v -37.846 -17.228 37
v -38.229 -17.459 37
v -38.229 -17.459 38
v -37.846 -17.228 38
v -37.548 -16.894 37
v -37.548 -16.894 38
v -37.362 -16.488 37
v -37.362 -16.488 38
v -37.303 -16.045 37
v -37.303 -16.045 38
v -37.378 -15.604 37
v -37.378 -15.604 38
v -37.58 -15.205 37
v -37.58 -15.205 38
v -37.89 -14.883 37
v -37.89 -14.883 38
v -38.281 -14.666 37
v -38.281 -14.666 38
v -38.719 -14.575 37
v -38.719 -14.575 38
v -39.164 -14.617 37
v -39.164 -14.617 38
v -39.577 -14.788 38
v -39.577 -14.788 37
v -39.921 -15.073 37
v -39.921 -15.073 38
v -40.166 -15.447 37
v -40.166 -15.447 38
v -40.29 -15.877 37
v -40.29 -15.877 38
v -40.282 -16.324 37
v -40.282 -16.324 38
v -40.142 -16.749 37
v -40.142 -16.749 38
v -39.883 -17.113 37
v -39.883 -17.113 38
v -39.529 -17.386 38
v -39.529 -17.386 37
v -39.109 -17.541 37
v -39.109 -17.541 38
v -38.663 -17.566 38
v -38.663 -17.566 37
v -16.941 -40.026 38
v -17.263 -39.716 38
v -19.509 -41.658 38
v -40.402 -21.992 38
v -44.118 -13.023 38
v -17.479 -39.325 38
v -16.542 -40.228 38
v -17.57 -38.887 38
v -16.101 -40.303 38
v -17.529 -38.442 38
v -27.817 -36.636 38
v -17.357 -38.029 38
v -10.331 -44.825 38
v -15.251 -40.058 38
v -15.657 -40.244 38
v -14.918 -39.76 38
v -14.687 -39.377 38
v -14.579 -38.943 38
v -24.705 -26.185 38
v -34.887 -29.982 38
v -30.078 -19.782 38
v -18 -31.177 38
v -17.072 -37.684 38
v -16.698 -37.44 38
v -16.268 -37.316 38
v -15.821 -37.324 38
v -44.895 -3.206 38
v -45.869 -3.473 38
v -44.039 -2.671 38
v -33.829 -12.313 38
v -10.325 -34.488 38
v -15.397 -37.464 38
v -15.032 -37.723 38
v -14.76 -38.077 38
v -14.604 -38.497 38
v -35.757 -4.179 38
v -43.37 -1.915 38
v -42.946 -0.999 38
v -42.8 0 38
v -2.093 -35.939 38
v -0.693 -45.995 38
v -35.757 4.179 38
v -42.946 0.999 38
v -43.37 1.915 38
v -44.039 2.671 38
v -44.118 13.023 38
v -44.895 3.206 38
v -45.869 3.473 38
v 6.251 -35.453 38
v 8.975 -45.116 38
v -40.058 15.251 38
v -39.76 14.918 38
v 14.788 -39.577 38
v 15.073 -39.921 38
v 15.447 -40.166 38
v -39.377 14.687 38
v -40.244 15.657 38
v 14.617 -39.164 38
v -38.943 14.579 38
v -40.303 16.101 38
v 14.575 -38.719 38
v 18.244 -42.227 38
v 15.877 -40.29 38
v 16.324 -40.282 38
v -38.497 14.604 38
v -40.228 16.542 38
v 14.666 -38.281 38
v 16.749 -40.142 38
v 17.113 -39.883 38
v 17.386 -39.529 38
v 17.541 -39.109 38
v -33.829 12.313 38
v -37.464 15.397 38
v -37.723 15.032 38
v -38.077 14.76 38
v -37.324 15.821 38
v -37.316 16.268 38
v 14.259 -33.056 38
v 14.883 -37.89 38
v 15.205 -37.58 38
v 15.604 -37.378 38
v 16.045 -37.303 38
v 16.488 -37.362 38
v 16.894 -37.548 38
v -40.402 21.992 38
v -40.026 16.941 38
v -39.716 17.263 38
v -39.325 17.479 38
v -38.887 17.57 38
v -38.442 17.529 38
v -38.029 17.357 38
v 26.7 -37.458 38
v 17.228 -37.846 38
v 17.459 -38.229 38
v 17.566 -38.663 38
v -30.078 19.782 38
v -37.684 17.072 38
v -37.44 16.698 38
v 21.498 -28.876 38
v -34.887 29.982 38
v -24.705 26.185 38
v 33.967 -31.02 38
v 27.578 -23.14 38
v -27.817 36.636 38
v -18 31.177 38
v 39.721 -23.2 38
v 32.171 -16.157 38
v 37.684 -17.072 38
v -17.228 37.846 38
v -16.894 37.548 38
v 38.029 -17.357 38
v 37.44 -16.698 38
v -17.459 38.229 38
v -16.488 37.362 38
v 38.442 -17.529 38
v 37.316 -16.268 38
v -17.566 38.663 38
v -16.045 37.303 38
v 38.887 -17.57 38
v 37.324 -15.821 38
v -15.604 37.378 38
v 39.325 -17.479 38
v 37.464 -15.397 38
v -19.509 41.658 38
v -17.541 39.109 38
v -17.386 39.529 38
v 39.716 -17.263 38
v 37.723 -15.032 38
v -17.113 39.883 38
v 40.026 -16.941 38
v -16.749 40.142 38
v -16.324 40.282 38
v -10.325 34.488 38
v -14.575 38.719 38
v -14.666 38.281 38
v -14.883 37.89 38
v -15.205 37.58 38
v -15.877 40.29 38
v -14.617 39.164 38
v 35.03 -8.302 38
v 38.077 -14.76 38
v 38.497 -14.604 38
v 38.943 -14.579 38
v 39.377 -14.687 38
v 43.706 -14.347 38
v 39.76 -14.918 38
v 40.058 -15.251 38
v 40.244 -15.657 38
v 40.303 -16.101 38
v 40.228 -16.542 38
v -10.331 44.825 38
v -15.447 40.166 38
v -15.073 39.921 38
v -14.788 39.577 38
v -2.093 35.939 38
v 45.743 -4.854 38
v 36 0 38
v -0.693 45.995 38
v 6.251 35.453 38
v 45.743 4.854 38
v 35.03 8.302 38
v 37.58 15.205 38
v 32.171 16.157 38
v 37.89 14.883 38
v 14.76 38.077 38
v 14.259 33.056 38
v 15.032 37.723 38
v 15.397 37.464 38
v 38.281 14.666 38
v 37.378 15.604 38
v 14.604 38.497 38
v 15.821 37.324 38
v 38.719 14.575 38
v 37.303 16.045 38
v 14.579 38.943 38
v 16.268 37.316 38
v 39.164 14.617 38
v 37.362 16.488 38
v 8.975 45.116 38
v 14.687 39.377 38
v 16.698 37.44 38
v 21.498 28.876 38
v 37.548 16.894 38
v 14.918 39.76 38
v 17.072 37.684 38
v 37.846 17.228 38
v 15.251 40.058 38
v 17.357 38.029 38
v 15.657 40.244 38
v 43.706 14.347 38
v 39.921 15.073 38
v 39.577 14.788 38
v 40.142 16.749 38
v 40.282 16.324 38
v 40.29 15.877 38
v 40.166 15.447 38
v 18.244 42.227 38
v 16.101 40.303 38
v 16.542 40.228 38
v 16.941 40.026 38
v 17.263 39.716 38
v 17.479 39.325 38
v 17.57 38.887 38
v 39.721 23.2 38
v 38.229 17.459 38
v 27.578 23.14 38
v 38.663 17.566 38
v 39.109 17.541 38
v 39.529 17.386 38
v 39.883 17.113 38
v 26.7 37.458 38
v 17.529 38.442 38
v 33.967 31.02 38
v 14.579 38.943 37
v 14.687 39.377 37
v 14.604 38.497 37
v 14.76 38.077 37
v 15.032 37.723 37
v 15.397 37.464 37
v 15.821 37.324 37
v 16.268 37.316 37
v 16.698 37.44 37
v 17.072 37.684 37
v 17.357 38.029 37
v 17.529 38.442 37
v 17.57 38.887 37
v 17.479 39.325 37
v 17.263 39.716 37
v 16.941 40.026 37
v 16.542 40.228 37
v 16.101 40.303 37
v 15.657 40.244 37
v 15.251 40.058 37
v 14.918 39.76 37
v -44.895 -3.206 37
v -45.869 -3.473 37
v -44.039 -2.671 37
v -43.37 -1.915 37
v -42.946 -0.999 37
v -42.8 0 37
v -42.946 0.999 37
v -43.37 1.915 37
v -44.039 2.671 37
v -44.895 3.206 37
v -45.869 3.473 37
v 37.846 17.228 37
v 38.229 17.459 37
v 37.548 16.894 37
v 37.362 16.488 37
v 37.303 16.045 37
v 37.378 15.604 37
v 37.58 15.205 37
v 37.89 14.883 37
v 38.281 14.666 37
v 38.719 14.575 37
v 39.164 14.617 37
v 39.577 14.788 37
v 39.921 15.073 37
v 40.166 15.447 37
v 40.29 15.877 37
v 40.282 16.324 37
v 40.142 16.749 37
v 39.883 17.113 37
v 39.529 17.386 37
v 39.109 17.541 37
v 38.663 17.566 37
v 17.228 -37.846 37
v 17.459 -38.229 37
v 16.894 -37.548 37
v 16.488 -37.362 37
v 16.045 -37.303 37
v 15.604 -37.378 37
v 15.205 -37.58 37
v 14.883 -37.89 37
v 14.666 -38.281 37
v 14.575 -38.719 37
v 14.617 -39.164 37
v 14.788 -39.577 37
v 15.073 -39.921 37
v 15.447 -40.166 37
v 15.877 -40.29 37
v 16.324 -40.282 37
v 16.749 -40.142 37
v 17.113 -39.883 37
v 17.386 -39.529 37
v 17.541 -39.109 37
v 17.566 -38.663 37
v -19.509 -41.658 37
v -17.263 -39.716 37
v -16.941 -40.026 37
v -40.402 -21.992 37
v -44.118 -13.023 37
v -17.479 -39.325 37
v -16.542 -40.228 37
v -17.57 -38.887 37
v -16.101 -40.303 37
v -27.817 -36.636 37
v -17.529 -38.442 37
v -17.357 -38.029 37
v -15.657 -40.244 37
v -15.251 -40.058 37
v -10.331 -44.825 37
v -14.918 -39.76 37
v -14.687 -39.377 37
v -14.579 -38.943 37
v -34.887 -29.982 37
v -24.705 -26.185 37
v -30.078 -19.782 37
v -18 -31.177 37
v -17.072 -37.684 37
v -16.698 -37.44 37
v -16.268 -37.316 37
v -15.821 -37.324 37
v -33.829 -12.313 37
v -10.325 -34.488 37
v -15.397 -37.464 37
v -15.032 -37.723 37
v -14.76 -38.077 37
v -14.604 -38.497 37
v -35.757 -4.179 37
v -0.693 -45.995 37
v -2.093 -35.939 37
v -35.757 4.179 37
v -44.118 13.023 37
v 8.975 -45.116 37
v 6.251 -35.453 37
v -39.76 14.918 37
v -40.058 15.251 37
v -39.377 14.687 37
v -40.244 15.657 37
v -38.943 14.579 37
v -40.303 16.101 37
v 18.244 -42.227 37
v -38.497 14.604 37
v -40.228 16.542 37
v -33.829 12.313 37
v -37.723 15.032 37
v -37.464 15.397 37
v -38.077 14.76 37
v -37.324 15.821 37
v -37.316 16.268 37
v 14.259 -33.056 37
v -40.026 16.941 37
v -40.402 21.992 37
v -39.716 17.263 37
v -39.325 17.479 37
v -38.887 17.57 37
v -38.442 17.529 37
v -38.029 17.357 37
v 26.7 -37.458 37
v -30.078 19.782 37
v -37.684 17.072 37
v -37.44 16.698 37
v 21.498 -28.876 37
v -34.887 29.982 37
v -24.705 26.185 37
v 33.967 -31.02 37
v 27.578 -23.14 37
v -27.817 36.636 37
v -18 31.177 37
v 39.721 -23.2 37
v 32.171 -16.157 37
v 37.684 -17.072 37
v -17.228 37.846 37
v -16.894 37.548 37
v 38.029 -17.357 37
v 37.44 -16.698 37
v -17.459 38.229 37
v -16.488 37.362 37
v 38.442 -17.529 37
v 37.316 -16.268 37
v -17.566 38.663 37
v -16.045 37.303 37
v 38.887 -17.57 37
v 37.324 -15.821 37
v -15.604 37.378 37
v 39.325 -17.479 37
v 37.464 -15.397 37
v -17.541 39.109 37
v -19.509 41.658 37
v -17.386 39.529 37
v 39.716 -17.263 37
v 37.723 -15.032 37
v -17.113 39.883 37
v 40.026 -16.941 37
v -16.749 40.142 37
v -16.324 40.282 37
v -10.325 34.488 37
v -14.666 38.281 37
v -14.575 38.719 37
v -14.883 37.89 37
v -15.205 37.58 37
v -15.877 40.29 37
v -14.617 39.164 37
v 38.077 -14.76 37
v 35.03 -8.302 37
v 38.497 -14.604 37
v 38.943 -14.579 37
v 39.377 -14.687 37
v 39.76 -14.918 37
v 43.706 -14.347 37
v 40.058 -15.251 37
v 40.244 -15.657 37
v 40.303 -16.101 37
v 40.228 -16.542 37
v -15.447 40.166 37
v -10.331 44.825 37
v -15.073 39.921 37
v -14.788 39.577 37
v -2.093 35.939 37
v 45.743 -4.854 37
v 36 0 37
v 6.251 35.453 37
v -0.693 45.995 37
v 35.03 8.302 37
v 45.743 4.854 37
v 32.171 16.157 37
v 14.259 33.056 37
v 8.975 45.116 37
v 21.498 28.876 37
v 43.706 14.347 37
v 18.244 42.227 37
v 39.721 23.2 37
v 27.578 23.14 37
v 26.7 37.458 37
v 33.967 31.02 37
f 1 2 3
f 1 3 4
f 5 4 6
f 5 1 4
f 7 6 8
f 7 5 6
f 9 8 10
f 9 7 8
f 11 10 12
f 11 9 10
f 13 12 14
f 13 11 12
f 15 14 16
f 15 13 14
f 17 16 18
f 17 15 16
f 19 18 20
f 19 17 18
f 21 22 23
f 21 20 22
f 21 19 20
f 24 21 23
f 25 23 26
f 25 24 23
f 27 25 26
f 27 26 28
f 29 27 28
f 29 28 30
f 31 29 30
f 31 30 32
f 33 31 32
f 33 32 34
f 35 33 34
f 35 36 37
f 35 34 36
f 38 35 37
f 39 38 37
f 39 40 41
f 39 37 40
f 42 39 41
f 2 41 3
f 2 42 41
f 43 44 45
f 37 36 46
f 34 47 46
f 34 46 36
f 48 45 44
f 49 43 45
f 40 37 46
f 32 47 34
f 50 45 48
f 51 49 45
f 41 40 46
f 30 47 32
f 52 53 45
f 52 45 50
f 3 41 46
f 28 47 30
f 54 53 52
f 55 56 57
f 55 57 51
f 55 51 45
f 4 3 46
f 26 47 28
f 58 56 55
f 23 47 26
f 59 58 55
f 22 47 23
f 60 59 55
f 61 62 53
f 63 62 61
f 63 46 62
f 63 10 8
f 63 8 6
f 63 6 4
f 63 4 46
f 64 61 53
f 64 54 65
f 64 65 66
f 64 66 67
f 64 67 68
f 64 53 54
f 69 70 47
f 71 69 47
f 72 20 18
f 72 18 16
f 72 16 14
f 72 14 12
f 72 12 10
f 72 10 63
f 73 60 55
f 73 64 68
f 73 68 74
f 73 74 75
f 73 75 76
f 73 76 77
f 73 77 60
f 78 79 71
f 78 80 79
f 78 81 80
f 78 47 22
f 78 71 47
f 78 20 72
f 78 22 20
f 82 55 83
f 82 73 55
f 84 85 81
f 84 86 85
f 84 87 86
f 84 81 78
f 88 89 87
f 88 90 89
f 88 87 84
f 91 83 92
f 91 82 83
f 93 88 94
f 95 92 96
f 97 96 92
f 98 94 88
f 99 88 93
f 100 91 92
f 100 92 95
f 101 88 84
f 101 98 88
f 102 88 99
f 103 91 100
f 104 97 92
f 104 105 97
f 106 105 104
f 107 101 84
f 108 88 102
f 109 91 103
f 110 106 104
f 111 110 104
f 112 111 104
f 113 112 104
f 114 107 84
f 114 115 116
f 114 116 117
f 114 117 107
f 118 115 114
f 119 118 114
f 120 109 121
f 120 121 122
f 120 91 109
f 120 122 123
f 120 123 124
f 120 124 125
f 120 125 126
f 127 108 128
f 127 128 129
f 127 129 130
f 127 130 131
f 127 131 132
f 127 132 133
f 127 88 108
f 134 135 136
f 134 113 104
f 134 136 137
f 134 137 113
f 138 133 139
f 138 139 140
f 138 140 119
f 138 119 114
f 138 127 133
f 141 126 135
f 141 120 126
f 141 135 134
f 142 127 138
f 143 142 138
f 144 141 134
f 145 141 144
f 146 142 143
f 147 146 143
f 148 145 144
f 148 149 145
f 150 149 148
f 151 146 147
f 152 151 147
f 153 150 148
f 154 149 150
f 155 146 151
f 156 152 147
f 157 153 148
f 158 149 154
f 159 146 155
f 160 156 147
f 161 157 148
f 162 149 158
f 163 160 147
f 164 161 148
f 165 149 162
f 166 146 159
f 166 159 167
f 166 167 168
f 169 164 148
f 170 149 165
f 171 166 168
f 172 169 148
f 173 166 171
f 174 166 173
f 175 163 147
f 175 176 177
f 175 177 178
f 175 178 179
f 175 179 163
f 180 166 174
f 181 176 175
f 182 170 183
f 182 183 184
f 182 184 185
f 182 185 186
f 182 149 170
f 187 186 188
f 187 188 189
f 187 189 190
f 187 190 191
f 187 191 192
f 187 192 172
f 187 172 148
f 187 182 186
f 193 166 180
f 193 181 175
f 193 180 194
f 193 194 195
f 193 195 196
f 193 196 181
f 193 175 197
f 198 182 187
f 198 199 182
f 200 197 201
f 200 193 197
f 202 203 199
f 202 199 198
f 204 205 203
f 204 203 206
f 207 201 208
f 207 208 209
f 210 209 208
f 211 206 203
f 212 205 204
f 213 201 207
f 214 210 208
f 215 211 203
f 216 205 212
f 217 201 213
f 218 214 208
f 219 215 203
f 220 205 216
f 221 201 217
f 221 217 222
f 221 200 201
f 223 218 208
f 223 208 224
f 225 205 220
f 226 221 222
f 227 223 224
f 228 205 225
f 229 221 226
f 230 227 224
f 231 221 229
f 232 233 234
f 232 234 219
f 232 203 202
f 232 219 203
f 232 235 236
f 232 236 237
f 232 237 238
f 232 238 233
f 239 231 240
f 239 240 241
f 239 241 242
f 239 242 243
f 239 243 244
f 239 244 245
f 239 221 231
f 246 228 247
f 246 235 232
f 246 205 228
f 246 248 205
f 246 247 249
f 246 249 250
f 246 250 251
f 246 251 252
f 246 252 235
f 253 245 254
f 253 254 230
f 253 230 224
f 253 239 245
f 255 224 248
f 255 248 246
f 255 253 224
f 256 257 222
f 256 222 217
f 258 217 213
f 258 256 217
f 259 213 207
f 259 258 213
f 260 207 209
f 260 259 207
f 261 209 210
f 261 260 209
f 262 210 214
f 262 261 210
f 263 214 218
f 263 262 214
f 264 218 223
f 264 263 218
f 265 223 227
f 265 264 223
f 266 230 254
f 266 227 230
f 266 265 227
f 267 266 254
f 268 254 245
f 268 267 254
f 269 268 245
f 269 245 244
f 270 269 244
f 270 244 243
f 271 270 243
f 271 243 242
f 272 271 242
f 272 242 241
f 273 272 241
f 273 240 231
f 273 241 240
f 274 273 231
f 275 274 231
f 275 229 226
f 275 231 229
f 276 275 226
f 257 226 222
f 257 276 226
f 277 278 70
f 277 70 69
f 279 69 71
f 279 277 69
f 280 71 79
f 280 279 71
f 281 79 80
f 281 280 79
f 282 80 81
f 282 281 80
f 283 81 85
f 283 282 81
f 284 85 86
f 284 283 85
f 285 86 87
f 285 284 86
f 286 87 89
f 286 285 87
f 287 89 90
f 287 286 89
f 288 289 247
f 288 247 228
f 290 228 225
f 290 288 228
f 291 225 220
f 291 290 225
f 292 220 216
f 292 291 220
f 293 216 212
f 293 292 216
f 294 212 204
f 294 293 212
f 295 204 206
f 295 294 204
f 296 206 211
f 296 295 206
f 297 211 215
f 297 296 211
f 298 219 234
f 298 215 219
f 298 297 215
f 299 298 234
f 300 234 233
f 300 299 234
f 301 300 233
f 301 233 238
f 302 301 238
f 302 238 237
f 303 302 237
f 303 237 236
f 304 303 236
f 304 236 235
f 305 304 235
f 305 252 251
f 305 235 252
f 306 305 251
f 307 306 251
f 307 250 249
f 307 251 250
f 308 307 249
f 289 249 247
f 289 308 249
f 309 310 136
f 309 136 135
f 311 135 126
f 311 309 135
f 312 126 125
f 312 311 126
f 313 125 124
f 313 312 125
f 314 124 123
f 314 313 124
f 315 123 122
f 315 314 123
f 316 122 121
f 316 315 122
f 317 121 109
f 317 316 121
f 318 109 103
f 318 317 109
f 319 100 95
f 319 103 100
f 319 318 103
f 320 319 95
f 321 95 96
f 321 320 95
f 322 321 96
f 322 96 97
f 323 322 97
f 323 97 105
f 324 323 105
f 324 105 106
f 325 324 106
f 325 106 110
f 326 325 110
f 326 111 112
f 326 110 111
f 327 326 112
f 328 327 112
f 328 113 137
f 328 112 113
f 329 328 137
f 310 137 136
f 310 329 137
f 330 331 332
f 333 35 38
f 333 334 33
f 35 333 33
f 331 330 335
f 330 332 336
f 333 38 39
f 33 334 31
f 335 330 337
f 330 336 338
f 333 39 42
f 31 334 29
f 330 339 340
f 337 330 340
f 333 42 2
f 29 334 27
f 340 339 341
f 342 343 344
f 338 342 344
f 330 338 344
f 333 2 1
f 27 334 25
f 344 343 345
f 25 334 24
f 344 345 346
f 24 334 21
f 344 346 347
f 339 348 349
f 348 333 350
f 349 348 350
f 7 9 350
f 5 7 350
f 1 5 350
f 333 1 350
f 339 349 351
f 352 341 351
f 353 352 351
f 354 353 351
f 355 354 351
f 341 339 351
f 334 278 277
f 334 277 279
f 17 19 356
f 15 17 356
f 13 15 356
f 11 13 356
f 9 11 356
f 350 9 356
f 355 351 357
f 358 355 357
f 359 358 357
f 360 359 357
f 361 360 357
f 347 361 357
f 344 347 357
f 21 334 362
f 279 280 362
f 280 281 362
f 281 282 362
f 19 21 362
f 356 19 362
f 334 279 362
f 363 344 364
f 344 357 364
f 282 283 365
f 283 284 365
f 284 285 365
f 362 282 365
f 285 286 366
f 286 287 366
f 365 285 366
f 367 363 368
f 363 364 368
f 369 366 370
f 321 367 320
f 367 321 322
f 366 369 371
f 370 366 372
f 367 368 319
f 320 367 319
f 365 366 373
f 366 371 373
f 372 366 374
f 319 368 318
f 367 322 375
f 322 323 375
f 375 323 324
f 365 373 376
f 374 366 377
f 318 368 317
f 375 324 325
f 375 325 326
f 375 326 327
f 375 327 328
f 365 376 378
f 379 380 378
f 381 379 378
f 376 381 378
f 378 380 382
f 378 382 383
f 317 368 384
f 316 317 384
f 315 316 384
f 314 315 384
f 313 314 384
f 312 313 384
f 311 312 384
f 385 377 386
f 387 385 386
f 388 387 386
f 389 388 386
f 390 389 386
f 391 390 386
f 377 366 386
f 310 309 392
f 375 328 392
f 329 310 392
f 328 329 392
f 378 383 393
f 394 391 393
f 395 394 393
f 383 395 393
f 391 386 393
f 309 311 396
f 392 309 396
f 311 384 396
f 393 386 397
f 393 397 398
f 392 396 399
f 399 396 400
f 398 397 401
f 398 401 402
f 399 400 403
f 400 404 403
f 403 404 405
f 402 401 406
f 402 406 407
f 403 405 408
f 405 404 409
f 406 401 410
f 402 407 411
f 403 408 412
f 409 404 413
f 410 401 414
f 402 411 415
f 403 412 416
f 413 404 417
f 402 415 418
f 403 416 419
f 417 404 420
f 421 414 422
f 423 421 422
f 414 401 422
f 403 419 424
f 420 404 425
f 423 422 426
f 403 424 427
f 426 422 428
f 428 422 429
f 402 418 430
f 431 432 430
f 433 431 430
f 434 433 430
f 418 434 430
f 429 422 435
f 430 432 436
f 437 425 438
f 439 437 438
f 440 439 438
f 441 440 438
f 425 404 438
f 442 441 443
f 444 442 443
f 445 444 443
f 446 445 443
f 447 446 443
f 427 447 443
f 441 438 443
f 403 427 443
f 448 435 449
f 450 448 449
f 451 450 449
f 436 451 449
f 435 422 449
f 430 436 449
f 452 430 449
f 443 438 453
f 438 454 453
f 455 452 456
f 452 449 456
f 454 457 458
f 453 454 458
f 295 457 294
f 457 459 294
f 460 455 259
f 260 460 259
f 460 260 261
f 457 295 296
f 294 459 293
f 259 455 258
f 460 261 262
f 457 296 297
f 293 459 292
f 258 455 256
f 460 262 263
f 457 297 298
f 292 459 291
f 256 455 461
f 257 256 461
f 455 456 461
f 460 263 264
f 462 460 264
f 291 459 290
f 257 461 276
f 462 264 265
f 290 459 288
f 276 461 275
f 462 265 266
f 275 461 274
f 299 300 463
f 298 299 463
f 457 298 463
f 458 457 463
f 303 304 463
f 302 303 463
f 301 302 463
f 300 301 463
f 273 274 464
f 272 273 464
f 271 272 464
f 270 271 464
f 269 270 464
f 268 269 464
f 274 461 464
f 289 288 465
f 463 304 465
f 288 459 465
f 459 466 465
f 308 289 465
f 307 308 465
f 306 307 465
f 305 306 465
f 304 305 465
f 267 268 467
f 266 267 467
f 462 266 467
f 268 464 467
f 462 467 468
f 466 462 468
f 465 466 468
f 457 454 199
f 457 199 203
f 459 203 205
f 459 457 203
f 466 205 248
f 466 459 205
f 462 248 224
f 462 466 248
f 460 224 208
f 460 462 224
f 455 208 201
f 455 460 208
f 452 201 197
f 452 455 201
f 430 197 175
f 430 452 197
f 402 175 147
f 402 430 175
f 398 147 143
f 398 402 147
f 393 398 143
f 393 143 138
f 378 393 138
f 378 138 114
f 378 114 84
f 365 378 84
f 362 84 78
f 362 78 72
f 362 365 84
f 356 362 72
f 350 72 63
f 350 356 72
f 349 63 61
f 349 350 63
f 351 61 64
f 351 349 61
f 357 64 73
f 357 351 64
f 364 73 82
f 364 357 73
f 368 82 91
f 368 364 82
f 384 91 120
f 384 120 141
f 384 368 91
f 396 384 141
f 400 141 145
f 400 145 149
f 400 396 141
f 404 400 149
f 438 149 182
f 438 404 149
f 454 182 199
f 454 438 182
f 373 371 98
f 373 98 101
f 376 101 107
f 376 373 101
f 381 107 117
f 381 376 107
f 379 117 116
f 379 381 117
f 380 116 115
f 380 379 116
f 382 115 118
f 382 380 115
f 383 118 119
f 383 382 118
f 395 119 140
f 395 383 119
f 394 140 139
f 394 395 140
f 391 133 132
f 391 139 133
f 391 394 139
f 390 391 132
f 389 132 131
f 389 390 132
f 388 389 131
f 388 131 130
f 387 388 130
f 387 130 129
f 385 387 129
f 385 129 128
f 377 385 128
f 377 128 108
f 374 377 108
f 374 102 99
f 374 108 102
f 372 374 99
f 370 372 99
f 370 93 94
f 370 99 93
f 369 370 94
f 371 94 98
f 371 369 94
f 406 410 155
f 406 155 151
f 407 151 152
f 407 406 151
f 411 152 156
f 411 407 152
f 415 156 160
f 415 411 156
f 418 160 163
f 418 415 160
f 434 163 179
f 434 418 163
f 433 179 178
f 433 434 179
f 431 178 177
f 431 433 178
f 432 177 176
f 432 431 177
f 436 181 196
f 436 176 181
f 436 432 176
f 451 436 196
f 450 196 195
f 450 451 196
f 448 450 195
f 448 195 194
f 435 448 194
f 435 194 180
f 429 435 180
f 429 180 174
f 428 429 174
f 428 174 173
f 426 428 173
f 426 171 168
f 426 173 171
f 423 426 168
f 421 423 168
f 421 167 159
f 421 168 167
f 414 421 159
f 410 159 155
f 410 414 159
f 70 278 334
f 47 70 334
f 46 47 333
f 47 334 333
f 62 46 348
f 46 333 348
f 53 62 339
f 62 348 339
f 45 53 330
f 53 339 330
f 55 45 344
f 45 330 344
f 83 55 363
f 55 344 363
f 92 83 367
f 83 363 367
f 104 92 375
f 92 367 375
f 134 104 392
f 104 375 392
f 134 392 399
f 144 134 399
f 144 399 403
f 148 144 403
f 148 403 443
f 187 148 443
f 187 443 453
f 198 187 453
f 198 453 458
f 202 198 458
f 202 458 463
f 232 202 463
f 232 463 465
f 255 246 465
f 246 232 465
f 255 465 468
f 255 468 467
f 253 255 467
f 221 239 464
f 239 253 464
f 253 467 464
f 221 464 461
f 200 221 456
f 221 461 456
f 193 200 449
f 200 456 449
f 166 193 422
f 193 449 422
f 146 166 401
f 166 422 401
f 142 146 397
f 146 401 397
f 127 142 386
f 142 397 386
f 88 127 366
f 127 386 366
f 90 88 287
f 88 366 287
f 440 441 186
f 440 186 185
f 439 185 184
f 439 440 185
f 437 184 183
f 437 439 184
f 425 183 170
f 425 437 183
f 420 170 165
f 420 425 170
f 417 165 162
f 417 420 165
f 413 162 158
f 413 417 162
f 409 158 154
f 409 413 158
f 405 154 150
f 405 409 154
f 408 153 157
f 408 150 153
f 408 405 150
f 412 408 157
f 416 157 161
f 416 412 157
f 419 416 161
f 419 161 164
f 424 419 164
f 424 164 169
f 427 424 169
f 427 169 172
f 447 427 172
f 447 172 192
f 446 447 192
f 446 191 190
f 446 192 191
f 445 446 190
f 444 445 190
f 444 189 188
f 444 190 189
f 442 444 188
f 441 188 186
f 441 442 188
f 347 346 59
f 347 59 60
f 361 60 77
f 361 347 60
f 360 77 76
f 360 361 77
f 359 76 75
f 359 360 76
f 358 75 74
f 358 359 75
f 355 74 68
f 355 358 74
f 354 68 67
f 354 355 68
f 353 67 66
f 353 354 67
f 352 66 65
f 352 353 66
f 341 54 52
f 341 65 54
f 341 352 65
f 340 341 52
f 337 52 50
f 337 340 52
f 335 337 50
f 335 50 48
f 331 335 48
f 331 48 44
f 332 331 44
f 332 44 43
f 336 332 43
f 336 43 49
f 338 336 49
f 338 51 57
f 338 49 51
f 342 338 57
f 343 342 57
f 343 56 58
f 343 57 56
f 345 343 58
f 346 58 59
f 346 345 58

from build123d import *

# Parameters (mm, degrees)
BOX319_W                    = 6
BOX319_H                    = 8
BOX319_DEPTH                = 2
BOX319_PLACEMENT_ANGLE      = 45
BOX321_W                    = 6
BOX321_H                    = 8
BOX321_DEPTH                = 2
BOX312_W                    = 6
BOX312_H                    = 8
BOX312_DEPTH                = 2
BOX324_W                    = 6
BOX324_H                    = 8
BOX324_DEPTH                = 2
BOX324_PLACEMENT_ANGLE      = 135
BOX322_W                    = 6
BOX322_H                    = 8
BOX322_DEPTH                = 2
BOX326_W                    = 6
BOX326_H                    = 8
BOX326_DEPTH                = 2
BOX326_PLACEMENT_ANGLE      = 225
BOX315_W                    = 6
BOX315_H                    = 8
BOX315_DEPTH                = 2
BOX325_W                    = 6
BOX325_H                    = 8
BOX325_DEPTH                = 2
BOX325_PLACEMENT_ANGLE      = 45
COMPOUND700_PLACEMENT_ANGLE = 22.5
CYLINDER700_R               = 1.5
CYLINDER700_DEPTH           = 12
CYLINDER700_PLACEMENT_ANGLE = 45
CYLINDER708_R               = 1.5
CYLINDER708_DEPTH           = 12
CYLINDER706_R               = 1.5
CYLINDER706_DEPTH           = 12
CYLINDER706_PLACEMENT_ANGLE = 135
CYLINDER705_R               = 1.5
CYLINDER705_DEPTH           = 12
CYLINDER707_R               = 1.5
CYLINDER707_DEPTH           = 12
CYLINDER707_PLACEMENT_ANGLE = 225
CYLINDER704_R               = 1.5
CYLINDER704_DEPTH           = 12
CYLINDER699_R               = 1.5
CYLINDER699_DEPTH           = 12
CYLINDER699_PLACEMENT_ANGLE = 45
CYLINDER702_R               = 1.5
CYLINDER702_DEPTH           = 12
COMPOUND701_PLACEMENT_ANGLE = 22.5
CYLINDER697_R               = 3.5
CYLINDER697_DEPTH           = 20
TUBE076_R                   = 46
TUBE076_R_2                 = 36
TUBE076_DEPTH               = 1


with BuildPart() as krychle319:
    # Box319 → Box319 (new body)
    with BuildSketch(Plane.XY):
        with Locations((3, 4)):
            Rectangle(BOX319_W, BOX319_H)
    extrude(amount=BOX319_DEPTH)


with BuildPart() as krychle319_1:
    # Box319 placement: moved
    add(krychle319.part.moved(Location((30.405592, -34.648232, 33))).rotate(Axis((30.405592, -34.648232, 33), (0, 0, 1)), BOX319_PLACEMENT_ANGLE))


with BuildPart() as krychle321:
    # Box321 → Box321 (new body)
    with BuildSketch(Plane(origin=(46, -3, 33), x_dir=(0, 1, 0), z_dir=(0, 0, 1))):
        with Locations((3, 4)):
            Rectangle(BOX321_W, BOX321_H)
    extrude(amount=BOX321_DEPTH)


with BuildPart() as krychle312:
    # Box312 → Box312 (new body)
    with BuildSketch(Plane(origin=(-3, -46, 33), x_dir=(1, 0, 0), z_dir=(0, 0, 1))):
        with Locations((3, 4)):
            Rectangle(BOX312_W, BOX312_H)
    extrude(amount=BOX312_DEPTH)


with BuildPart() as krychle324:
    # Box324 → Box324 (new body)
    with BuildSketch(Plane.XY):
        with Locations((3, 4)):
            Rectangle(BOX324_W, BOX324_H)
    extrude(amount=BOX324_DEPTH)


with BuildPart() as krychle324_1:
    # Box324 placement: moved
    add(krychle324.part.moved(Location((34.648232, 30.405592, 33))).rotate(Axis((34.648232, 30.405592, 33), (0, 0, 1)), BOX324_PLACEMENT_ANGLE))


with BuildPart() as krychle322:
    # Box322 → Box322 (new body)
    with BuildSketch(Plane(origin=(3, 46, 33), x_dir=(-1, 0, 0), z_dir=(0, 0, 1))):
        with Locations((3, 4)):
            Rectangle(BOX322_W, BOX322_H)
    extrude(amount=BOX322_DEPTH)


with BuildPart() as krychle326:
    # Box326 → Box326 (new body)
    with BuildSketch(Plane.XY):
        with Locations((3, 4)):
            Rectangle(BOX326_W, BOX326_H)
    extrude(amount=BOX326_DEPTH)


with BuildPart() as krychle326_1:
    # Box326 placement: moved
    add(krychle326.part.moved(Location((-30.405592, 34.648232, 33))).rotate(Axis((-30.405592, 34.648232, 33), (0, 0, 1)), BOX326_PLACEMENT_ANGLE))


with BuildPart() as krychle315:
    # Box315 → Box315 (new body)
    with BuildSketch(Plane(origin=(-46, 3, 33), x_dir=(0, -1, 0), z_dir=(0, 0, 1))):
        with Locations((3, 4)):
            Rectangle(BOX315_W, BOX315_H)
    extrude(amount=BOX315_DEPTH)


with BuildPart() as compound700:
    # Box325 → Box325 (new body)
    with BuildSketch(Plane.XY):
        with Locations((3, 4)):
            Rectangle(BOX325_W, BOX325_H)
    extrude(amount=BOX325_DEPTH)


with BuildPart() as compound700_1:
    # Box325 placement: moved
    add(compound700.part.moved(Location((-34.648232, -30.405592, 33))).rotate(Axis((-34.648232, -30.405592, 33), (0, 0, -1)), BOX325_PLACEMENT_ANGLE))

    # Compound700: union Krychle319, Krychle321, Krychle312, Krychle324, Krychle322, Krychle326, Krychle315
    add(krychle319_1.part)
    add(krychle321.part)
    add(krychle312.part)
    add(krychle324_1.part)
    add(krychle322.part)
    add(krychle326_1.part)
    add(krychle315.part)


with BuildPart() as compound700_2:
    # Compound700 placement: moved
    add(compound700_1.part.rotate(Axis((0, 0, 0), (0, 0, 1)), COMPOUND700_PLACEMENT_ANGLE))


with BuildPart() as v_lec700:
    # Cylinder700 → Cylinder700 (new body)
    with BuildSketch(Plane.XY):
        Circle(CYLINDER700_R)
    extrude(amount=CYLINDER700_DEPTH)


with BuildPart() as v_lec700_1:
    # Cylinder700 placement: moved
    add(v_lec700.part.moved(Location((29.698485, -29.698485, 33.5))).rotate(Axis((29.698485, -29.698485, 33.5), (0, 0, 1)), CYLINDER700_PLACEMENT_ANGLE))


with BuildPart() as v_lec708:
    # Cylinder708 → Cylinder708 (new body)
    with BuildSketch(Plane(origin=(42, 0, 33.5), x_dir=(0, 1, 0), z_dir=(0, 0, 1))):
        Circle(CYLINDER708_R)
    extrude(amount=CYLINDER708_DEPTH)


with BuildPart() as v_lec706:
    # Cylinder706 → Cylinder706 (new body)
    with BuildSketch(Plane.XY):
        Circle(CYLINDER706_R)
    extrude(amount=CYLINDER706_DEPTH)


with BuildPart() as v_lec706_1:
    # Cylinder706 placement: moved
    add(v_lec706.part.moved(Location((29.698485, 29.698485, 33.5))).rotate(Axis((29.698485, 29.698485, 33.5), (0, 0, 1)), CYLINDER706_PLACEMENT_ANGLE))


with BuildPart() as v_lec705:
    # Cylinder705 → Cylinder705 (new body)
    with BuildSketch(Plane(origin=(0, 42, 33.5), x_dir=(-1, 0, 0), z_dir=(0, 0, 1))):
        Circle(CYLINDER705_R)
    extrude(amount=CYLINDER705_DEPTH)


with BuildPart() as v_lec707:
    # Cylinder707 → Cylinder707 (new body)
    with BuildSketch(Plane.XY):
        Circle(CYLINDER707_R)
    extrude(amount=CYLINDER707_DEPTH)


with BuildPart() as v_lec707_1:
    # Cylinder707 placement: moved
    add(v_lec707.part.moved(Location((-29.698485, 29.698485, 33.5))).rotate(Axis((-29.698485, 29.698485, 33.5), (0, 0, 1)), CYLINDER707_PLACEMENT_ANGLE))


with BuildPart() as v_lec704:
    # Cylinder704 → Cylinder704 (new body)
    with BuildSketch(Plane(origin=(-42, 0, 33.5), x_dir=(0, -1, 0), z_dir=(0, 0, 1))):
        Circle(CYLINDER704_R)
    extrude(amount=CYLINDER704_DEPTH)


with BuildPart() as v_lec699:
    # Cylinder699 → Cylinder699 (new body)
    with BuildSketch(Plane.XY):
        Circle(CYLINDER699_R)
    extrude(amount=CYLINDER699_DEPTH)


with BuildPart() as v_lec699_1:
    # Cylinder699 placement: moved
    add(v_lec699.part.moved(Location((-29.698485, -29.698485, 33.5))).rotate(Axis((-29.698485, -29.698485, 33.5), (0, 0, -1)), CYLINDER699_PLACEMENT_ANGLE))


with BuildPart() as compound701:
    # Cylinder702 → Cylinder702 (new body)
    with BuildSketch(Plane(origin=(0, -42, 33.5), x_dir=(1, 0, 0), z_dir=(0, 0, 1))):
        Circle(CYLINDER702_R)
    extrude(amount=CYLINDER702_DEPTH)

    # Compound701: union Válec700, Válec708, Válec706, Válec705, Válec707, Válec704, Válec699
    add(v_lec700_1.part)
    add(v_lec708.part)
    add(v_lec706_1.part)
    add(v_lec705.part)
    add(v_lec707_1.part)
    add(v_lec704.part)
    add(v_lec699_1.part)


with BuildPart() as compound701_1:
    # Compound701 placement: moved
    add(compound701.part.rotate(Axis((0, 0, 0), (0, 0, 1)), COMPOUND701_PLACEMENT_ANGLE))


with BuildPart() as v_lec697:
    # Cylinder697 → Cylinder697 (new body)
    with BuildSketch(Plane(origin=(-46.3, 0, 29), x_dir=(1, 0, 0), z_dir=(0, 0, 1))):
        Circle(CYLINDER697_R)
    extrude(amount=CYLINDER697_DEPTH)


with BuildPart() as cut321:
    # Tube076 → Tube076 (new body)
    with BuildSketch(Plane.XY.offset(37)):
        Circle(TUBE076_R)
        Circle(TUBE076_R_2, mode=Mode.SUBTRACT)
    extrude(amount=TUBE076_DEPTH)

    # Cut323: cut Válec697
    add(v_lec697.part, mode=Mode.SUBTRACT)

    # Cut330: cut Compound701
    add(compound701_1.part, mode=Mode.SUBTRACT)

    # Cut321: cut Compound700
    add(compound700_2.part, mode=Mode.SUBTRACT)


solid = cut321.part
